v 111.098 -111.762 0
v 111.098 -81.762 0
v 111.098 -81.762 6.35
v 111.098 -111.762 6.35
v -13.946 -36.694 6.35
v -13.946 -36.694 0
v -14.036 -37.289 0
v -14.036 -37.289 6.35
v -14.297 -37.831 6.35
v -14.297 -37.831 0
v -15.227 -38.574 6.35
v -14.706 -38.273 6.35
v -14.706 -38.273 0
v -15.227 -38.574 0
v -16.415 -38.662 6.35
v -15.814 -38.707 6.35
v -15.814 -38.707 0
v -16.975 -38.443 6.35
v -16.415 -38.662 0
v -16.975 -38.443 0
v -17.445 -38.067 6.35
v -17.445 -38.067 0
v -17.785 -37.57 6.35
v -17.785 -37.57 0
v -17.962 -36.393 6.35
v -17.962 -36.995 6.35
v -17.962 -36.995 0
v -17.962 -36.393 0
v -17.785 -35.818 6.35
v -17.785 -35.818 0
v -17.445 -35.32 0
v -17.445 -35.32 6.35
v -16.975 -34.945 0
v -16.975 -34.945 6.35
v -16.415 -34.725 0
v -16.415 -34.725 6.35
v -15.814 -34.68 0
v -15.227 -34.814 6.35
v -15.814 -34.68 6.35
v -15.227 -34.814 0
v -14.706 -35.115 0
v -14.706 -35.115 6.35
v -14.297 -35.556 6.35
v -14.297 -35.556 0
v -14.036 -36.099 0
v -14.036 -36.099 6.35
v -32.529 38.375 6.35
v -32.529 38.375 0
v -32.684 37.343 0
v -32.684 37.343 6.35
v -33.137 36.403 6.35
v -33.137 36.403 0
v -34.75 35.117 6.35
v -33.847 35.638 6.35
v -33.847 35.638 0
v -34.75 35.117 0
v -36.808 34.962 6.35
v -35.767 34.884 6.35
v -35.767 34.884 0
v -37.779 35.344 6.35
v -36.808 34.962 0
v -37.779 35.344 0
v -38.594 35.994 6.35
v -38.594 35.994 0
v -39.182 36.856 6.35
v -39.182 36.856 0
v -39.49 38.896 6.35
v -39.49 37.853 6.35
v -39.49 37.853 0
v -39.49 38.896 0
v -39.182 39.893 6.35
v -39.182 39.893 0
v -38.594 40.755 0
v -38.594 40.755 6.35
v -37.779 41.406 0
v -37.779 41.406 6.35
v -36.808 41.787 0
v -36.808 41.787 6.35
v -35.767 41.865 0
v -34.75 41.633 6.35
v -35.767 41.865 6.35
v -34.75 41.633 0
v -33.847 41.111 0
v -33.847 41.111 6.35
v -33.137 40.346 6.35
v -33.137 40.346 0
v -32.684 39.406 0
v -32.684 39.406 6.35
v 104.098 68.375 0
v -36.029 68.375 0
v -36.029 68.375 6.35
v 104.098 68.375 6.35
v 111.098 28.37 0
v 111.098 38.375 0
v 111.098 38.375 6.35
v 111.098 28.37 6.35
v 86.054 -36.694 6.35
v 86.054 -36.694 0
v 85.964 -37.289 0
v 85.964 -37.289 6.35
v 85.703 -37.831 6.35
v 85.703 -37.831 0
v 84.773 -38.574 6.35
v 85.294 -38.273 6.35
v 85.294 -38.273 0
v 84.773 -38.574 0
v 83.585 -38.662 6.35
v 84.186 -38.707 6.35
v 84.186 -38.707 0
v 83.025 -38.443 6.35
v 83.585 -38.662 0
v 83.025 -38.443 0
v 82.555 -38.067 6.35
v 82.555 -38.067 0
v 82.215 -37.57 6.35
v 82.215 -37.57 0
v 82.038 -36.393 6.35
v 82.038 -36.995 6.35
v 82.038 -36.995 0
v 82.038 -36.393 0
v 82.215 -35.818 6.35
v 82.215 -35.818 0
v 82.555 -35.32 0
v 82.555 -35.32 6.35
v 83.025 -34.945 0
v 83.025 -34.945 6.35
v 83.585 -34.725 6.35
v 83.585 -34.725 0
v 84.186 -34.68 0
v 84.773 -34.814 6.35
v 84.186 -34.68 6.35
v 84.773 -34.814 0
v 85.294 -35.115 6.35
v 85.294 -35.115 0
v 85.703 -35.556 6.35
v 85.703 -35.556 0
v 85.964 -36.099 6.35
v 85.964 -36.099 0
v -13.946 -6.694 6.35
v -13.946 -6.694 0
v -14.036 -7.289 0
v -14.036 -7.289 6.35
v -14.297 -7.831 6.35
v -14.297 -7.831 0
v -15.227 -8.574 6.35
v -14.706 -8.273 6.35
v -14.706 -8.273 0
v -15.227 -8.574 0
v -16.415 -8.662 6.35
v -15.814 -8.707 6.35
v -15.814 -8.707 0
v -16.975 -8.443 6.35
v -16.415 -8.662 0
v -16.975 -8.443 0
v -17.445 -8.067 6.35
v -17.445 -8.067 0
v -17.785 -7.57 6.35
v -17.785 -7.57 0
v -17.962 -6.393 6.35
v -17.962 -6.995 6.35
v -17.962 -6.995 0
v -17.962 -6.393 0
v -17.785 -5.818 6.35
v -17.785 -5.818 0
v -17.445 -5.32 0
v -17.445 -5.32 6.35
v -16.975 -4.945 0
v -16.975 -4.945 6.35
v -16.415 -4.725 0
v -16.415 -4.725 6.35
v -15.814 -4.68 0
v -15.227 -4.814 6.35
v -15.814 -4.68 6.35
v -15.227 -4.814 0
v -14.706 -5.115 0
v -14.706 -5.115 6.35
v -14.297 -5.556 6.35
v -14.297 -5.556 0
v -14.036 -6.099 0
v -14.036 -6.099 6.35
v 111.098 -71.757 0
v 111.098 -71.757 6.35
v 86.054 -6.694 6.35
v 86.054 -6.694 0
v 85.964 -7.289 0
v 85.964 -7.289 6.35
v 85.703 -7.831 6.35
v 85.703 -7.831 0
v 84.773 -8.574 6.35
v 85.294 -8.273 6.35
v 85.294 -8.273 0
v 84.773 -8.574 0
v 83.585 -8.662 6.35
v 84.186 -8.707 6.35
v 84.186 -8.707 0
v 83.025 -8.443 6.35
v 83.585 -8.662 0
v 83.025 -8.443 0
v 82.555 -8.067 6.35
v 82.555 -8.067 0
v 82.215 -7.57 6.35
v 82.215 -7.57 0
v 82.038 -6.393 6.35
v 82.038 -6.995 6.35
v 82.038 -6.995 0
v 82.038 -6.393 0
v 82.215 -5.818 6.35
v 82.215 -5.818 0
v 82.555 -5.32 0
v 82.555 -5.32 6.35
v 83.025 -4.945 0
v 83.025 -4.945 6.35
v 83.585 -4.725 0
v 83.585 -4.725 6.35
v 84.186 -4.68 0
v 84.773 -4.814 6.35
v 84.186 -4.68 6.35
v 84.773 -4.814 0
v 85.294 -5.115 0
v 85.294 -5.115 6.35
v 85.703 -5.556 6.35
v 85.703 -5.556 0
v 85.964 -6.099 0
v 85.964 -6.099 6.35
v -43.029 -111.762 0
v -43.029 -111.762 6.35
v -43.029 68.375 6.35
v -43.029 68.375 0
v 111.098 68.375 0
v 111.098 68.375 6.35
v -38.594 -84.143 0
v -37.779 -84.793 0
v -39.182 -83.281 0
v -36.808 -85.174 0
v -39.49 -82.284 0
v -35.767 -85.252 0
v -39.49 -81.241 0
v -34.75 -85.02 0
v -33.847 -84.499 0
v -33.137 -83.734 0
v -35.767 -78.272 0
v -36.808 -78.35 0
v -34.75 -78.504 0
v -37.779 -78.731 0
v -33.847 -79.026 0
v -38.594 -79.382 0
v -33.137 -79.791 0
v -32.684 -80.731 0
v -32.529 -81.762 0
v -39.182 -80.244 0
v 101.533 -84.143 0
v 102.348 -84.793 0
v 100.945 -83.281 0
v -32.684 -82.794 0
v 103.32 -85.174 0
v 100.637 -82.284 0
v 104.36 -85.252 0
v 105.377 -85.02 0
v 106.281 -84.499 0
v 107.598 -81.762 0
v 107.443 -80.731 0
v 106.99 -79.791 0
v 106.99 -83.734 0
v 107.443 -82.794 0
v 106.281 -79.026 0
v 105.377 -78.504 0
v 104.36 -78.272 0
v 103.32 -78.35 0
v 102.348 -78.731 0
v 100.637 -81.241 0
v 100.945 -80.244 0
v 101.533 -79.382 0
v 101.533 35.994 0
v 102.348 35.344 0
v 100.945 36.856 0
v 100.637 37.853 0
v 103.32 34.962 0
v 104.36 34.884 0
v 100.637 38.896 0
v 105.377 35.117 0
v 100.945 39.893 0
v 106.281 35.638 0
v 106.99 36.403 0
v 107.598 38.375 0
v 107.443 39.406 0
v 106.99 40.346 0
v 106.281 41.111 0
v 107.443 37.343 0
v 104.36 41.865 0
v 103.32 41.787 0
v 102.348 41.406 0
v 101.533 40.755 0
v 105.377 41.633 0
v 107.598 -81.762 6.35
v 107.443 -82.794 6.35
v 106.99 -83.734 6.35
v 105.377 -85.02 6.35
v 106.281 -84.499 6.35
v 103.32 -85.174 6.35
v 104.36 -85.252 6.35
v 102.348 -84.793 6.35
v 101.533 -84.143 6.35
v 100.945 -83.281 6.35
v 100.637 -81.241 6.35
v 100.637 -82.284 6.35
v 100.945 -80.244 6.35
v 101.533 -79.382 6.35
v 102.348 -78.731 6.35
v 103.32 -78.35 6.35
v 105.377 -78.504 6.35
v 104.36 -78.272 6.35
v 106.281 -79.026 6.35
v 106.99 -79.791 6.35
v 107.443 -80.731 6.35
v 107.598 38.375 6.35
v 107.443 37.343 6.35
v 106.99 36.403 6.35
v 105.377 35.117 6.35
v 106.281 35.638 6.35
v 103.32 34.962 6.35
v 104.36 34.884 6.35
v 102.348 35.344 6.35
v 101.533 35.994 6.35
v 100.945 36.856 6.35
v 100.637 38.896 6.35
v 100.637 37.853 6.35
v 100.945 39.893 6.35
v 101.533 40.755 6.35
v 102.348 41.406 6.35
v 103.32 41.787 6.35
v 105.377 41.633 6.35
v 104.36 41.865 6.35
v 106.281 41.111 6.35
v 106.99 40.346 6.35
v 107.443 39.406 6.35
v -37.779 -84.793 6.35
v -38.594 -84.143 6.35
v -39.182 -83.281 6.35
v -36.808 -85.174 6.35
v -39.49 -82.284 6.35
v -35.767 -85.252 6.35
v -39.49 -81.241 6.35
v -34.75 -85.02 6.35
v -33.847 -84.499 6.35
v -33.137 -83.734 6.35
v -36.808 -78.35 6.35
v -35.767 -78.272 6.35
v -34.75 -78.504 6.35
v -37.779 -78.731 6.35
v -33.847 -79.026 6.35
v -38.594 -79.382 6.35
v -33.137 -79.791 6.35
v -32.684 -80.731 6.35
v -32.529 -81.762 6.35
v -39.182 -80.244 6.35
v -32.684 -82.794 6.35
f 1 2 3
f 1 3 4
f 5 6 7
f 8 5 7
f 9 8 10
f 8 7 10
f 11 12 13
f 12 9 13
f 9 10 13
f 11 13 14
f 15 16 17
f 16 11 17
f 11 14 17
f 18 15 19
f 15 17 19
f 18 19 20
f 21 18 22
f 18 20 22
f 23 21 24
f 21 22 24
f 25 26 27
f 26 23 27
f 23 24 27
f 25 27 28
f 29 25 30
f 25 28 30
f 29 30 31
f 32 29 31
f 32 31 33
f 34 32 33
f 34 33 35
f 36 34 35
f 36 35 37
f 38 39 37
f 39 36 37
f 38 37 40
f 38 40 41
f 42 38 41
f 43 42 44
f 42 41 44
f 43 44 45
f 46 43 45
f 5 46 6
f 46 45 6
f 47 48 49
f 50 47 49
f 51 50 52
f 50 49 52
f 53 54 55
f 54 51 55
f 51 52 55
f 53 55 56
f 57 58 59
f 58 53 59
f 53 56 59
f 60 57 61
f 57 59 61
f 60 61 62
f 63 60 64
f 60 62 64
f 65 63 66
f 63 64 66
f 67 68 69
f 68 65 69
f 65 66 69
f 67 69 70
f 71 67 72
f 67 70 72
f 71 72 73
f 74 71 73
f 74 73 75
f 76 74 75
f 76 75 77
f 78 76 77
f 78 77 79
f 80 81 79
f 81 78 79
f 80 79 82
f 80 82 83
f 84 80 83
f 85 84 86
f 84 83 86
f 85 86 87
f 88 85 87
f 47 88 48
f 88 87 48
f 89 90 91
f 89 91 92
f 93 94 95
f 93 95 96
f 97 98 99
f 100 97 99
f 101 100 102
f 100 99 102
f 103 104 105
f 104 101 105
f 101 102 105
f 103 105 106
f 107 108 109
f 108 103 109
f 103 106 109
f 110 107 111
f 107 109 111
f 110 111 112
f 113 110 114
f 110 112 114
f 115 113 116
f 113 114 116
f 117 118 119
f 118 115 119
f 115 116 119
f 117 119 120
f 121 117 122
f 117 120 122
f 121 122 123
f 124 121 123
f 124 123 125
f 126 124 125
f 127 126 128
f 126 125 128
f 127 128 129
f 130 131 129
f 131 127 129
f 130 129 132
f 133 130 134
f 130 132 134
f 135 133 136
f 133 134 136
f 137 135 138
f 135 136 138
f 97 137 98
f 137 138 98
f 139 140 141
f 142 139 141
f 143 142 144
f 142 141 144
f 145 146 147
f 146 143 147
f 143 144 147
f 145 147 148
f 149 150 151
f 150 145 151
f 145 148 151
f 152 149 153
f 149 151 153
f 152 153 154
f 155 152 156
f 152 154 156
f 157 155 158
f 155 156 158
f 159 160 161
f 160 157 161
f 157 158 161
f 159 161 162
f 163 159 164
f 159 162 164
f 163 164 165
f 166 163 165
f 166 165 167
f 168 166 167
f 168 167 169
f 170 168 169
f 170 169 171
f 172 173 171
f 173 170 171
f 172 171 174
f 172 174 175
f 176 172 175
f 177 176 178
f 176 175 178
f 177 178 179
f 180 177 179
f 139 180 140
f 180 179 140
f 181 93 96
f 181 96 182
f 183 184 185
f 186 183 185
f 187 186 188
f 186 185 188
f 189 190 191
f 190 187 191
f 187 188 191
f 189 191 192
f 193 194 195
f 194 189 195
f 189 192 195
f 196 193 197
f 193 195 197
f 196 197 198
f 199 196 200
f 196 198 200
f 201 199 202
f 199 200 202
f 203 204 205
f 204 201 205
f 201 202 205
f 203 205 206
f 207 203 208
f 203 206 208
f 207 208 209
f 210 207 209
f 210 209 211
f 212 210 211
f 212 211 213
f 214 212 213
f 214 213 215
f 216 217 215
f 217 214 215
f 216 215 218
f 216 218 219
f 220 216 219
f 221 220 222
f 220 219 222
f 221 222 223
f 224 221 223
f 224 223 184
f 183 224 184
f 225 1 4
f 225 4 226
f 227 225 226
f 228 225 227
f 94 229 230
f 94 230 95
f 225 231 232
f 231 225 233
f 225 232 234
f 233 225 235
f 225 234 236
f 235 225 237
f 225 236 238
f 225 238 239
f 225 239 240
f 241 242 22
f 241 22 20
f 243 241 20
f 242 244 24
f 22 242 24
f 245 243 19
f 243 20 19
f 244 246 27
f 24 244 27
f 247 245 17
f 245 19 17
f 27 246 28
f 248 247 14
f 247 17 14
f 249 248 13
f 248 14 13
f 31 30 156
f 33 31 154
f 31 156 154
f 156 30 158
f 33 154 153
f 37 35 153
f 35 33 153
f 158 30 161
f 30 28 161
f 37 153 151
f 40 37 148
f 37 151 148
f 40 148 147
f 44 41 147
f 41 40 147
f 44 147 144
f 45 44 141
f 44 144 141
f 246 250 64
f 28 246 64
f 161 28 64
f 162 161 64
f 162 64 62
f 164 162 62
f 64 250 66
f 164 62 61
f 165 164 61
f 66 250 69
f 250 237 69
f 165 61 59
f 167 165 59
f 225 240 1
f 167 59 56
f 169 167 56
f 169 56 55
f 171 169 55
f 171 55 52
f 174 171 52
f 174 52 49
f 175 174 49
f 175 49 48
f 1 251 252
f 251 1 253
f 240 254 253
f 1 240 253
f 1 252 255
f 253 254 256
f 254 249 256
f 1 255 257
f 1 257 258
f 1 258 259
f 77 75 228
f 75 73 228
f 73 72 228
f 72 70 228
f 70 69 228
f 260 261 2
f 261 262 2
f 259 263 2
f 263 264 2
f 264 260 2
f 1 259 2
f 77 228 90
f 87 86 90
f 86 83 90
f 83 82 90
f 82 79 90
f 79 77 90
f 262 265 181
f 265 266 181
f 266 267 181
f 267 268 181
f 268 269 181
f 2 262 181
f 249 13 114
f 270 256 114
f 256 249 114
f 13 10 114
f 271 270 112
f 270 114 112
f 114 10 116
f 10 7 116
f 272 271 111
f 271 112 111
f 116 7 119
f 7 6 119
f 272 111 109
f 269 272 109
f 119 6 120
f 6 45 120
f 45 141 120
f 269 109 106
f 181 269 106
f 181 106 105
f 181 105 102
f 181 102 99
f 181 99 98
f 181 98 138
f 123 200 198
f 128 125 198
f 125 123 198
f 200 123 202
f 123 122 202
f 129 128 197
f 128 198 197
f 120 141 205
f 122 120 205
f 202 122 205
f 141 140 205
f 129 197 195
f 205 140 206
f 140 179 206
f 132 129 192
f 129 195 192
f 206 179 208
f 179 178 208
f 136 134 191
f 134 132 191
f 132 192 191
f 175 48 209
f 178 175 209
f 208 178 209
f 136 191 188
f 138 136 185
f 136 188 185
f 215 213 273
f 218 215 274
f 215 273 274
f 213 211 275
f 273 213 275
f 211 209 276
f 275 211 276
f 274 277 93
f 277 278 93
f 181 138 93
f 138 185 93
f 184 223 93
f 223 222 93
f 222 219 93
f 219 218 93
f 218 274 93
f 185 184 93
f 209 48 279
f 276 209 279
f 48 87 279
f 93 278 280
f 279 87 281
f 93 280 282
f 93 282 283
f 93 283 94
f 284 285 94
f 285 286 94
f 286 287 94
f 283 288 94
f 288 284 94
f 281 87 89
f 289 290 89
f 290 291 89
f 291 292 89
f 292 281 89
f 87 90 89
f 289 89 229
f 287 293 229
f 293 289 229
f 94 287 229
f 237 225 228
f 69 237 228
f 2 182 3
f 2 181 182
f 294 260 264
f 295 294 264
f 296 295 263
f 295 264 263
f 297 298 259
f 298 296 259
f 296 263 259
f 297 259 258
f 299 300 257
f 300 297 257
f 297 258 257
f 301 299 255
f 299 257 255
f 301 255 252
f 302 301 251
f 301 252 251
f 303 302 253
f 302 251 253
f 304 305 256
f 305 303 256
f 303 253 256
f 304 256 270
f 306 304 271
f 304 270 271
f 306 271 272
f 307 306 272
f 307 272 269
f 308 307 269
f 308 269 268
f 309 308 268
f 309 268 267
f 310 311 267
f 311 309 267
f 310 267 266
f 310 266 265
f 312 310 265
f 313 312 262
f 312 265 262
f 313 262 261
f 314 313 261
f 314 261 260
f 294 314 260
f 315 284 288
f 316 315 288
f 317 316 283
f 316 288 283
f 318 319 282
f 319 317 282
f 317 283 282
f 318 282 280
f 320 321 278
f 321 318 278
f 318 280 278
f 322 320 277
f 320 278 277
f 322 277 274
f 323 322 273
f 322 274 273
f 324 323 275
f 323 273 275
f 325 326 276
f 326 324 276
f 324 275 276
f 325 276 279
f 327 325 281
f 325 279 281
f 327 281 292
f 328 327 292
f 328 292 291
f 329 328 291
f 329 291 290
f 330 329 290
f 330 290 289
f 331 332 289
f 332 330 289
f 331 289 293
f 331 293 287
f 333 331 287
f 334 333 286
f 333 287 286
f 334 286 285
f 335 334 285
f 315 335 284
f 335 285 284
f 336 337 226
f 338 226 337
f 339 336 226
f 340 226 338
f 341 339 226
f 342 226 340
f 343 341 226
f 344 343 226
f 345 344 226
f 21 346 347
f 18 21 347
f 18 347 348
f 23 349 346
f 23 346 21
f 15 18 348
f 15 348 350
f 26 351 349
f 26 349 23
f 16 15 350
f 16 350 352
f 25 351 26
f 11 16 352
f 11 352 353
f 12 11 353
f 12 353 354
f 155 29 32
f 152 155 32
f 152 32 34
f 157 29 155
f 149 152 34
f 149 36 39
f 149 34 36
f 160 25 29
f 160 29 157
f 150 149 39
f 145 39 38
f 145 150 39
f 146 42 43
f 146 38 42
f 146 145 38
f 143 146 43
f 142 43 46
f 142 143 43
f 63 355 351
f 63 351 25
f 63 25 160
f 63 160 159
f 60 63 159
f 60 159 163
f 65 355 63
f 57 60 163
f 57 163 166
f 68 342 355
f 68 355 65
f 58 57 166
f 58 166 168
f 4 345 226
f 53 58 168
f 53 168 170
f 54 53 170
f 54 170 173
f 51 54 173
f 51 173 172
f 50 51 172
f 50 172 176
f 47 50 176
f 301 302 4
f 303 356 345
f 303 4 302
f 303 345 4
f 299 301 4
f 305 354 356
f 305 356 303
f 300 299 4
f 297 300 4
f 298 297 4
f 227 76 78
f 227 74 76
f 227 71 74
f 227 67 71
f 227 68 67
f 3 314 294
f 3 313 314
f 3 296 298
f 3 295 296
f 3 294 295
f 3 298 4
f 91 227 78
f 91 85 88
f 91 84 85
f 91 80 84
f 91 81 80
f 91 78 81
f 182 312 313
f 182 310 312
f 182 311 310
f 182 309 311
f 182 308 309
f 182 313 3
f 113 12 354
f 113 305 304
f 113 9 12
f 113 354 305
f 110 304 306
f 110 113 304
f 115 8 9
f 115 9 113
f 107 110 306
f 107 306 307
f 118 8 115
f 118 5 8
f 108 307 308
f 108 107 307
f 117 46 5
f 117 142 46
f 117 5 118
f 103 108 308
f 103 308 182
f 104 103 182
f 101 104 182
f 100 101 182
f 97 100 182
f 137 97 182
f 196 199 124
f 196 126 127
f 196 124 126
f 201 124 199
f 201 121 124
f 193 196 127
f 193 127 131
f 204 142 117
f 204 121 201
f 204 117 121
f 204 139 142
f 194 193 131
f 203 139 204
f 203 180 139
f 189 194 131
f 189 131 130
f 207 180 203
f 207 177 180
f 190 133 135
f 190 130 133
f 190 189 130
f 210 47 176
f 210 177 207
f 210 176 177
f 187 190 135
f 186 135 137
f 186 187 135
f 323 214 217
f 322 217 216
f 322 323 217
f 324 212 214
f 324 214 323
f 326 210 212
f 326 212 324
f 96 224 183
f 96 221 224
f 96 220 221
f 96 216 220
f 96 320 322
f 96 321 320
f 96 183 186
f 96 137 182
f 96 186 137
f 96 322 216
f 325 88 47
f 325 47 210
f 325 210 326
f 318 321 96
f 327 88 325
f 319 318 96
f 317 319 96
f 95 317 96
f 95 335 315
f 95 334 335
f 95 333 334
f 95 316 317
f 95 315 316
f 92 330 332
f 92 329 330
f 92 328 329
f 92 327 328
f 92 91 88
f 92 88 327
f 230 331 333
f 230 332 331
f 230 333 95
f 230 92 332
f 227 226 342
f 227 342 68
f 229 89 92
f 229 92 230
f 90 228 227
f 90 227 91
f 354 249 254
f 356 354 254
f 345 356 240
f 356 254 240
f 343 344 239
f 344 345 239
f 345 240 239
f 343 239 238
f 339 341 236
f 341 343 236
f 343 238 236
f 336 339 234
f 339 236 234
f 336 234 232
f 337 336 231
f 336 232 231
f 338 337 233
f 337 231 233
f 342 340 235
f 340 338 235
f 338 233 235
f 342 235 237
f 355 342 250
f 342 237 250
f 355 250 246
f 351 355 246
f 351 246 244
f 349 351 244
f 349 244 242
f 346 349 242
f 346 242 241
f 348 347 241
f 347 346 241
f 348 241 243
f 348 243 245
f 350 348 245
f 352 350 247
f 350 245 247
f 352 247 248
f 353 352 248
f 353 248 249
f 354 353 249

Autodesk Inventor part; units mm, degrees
ref_plane "YZ Plane" through (0, 0, 0) normal (1, 0, 0) x (0, 1, 0)
ref_plane "XZ Plane" through (0, 0, 0) normal (0, 1, 0) x (-1, 0, 0)
ref_plane "XY Plane" through (0, 0, 0) normal (0, 0, 1) x (1, 0, 0)
sketch "Sketch1" plane through (0, 0, 0) normal (0, 0, 1) x (1, 0, 0)
  line L0 (-43.0288, 68.3746) -> (111.0984, 68.3746)
  line L1 (111.0984, 68.3746) -> (111.0984, -111.7622)
  line L2 (111.0984, -111.7622) -> (-43.0288, -111.7622)
  line L3 (-43.0288, -111.7622) -> (-43.0288, 68.3746)
  line L4 (111.0984, 68.3746) -> (111.0984, 28.3696)
  line L5 (-43.0288, 68.3746) -> (-36.0288, 68.3746)
  line L6 (111.0984, 68.3746) -> (104.0984, 68.3746)
  line L7 (111.0984, -111.7622) -> (111.0984, -71.7572)
  line L8 (111.0984, 68.3746) -> (111.0984, 38.3746)
  line L9 (111.0984, -111.7622) -> (111.0984, -81.7622)
  circle A0 centre (104.0984, 38.3746) radius 3.5
  circle A1 centre (104.0984, -81.7622) radius 3.5
  circle A2 centre (-36.0288, 38.3746) radius 3.5
  circle A3 centre (-36.0288, -81.7622) radius 3.5
  circle A4 centre (-15.9652, -6.6938) radius 2.0193
  circle A5 centre (-15.9652, -36.6938) radius 2.0193
  circle A6 centre (84.0348, -36.6938) radius 2.0193
  circle A7 centre (84.0348, -6.6938) radius 2.0193
  point P0 (0, 0)
  dimension "d0" = 154.1272
  dimension "d1" = 180.1368
  dimension "d3" = 7
  dimension "d4" = 7
  dimension "d30" = 30
  dimension "d31" = 30
  dimension "d32" = 7
  dimension "d33" = 7
  dimension "d38" = 4.0386
  dimension "d39" = 4.0386
  dimension "d40" = 4.0386
  dimension "d41" = 4.0386
extrude "Extrusion1" add sketch "Sketch1" along normal blind 6.35
properties part number "xy axis mount"
